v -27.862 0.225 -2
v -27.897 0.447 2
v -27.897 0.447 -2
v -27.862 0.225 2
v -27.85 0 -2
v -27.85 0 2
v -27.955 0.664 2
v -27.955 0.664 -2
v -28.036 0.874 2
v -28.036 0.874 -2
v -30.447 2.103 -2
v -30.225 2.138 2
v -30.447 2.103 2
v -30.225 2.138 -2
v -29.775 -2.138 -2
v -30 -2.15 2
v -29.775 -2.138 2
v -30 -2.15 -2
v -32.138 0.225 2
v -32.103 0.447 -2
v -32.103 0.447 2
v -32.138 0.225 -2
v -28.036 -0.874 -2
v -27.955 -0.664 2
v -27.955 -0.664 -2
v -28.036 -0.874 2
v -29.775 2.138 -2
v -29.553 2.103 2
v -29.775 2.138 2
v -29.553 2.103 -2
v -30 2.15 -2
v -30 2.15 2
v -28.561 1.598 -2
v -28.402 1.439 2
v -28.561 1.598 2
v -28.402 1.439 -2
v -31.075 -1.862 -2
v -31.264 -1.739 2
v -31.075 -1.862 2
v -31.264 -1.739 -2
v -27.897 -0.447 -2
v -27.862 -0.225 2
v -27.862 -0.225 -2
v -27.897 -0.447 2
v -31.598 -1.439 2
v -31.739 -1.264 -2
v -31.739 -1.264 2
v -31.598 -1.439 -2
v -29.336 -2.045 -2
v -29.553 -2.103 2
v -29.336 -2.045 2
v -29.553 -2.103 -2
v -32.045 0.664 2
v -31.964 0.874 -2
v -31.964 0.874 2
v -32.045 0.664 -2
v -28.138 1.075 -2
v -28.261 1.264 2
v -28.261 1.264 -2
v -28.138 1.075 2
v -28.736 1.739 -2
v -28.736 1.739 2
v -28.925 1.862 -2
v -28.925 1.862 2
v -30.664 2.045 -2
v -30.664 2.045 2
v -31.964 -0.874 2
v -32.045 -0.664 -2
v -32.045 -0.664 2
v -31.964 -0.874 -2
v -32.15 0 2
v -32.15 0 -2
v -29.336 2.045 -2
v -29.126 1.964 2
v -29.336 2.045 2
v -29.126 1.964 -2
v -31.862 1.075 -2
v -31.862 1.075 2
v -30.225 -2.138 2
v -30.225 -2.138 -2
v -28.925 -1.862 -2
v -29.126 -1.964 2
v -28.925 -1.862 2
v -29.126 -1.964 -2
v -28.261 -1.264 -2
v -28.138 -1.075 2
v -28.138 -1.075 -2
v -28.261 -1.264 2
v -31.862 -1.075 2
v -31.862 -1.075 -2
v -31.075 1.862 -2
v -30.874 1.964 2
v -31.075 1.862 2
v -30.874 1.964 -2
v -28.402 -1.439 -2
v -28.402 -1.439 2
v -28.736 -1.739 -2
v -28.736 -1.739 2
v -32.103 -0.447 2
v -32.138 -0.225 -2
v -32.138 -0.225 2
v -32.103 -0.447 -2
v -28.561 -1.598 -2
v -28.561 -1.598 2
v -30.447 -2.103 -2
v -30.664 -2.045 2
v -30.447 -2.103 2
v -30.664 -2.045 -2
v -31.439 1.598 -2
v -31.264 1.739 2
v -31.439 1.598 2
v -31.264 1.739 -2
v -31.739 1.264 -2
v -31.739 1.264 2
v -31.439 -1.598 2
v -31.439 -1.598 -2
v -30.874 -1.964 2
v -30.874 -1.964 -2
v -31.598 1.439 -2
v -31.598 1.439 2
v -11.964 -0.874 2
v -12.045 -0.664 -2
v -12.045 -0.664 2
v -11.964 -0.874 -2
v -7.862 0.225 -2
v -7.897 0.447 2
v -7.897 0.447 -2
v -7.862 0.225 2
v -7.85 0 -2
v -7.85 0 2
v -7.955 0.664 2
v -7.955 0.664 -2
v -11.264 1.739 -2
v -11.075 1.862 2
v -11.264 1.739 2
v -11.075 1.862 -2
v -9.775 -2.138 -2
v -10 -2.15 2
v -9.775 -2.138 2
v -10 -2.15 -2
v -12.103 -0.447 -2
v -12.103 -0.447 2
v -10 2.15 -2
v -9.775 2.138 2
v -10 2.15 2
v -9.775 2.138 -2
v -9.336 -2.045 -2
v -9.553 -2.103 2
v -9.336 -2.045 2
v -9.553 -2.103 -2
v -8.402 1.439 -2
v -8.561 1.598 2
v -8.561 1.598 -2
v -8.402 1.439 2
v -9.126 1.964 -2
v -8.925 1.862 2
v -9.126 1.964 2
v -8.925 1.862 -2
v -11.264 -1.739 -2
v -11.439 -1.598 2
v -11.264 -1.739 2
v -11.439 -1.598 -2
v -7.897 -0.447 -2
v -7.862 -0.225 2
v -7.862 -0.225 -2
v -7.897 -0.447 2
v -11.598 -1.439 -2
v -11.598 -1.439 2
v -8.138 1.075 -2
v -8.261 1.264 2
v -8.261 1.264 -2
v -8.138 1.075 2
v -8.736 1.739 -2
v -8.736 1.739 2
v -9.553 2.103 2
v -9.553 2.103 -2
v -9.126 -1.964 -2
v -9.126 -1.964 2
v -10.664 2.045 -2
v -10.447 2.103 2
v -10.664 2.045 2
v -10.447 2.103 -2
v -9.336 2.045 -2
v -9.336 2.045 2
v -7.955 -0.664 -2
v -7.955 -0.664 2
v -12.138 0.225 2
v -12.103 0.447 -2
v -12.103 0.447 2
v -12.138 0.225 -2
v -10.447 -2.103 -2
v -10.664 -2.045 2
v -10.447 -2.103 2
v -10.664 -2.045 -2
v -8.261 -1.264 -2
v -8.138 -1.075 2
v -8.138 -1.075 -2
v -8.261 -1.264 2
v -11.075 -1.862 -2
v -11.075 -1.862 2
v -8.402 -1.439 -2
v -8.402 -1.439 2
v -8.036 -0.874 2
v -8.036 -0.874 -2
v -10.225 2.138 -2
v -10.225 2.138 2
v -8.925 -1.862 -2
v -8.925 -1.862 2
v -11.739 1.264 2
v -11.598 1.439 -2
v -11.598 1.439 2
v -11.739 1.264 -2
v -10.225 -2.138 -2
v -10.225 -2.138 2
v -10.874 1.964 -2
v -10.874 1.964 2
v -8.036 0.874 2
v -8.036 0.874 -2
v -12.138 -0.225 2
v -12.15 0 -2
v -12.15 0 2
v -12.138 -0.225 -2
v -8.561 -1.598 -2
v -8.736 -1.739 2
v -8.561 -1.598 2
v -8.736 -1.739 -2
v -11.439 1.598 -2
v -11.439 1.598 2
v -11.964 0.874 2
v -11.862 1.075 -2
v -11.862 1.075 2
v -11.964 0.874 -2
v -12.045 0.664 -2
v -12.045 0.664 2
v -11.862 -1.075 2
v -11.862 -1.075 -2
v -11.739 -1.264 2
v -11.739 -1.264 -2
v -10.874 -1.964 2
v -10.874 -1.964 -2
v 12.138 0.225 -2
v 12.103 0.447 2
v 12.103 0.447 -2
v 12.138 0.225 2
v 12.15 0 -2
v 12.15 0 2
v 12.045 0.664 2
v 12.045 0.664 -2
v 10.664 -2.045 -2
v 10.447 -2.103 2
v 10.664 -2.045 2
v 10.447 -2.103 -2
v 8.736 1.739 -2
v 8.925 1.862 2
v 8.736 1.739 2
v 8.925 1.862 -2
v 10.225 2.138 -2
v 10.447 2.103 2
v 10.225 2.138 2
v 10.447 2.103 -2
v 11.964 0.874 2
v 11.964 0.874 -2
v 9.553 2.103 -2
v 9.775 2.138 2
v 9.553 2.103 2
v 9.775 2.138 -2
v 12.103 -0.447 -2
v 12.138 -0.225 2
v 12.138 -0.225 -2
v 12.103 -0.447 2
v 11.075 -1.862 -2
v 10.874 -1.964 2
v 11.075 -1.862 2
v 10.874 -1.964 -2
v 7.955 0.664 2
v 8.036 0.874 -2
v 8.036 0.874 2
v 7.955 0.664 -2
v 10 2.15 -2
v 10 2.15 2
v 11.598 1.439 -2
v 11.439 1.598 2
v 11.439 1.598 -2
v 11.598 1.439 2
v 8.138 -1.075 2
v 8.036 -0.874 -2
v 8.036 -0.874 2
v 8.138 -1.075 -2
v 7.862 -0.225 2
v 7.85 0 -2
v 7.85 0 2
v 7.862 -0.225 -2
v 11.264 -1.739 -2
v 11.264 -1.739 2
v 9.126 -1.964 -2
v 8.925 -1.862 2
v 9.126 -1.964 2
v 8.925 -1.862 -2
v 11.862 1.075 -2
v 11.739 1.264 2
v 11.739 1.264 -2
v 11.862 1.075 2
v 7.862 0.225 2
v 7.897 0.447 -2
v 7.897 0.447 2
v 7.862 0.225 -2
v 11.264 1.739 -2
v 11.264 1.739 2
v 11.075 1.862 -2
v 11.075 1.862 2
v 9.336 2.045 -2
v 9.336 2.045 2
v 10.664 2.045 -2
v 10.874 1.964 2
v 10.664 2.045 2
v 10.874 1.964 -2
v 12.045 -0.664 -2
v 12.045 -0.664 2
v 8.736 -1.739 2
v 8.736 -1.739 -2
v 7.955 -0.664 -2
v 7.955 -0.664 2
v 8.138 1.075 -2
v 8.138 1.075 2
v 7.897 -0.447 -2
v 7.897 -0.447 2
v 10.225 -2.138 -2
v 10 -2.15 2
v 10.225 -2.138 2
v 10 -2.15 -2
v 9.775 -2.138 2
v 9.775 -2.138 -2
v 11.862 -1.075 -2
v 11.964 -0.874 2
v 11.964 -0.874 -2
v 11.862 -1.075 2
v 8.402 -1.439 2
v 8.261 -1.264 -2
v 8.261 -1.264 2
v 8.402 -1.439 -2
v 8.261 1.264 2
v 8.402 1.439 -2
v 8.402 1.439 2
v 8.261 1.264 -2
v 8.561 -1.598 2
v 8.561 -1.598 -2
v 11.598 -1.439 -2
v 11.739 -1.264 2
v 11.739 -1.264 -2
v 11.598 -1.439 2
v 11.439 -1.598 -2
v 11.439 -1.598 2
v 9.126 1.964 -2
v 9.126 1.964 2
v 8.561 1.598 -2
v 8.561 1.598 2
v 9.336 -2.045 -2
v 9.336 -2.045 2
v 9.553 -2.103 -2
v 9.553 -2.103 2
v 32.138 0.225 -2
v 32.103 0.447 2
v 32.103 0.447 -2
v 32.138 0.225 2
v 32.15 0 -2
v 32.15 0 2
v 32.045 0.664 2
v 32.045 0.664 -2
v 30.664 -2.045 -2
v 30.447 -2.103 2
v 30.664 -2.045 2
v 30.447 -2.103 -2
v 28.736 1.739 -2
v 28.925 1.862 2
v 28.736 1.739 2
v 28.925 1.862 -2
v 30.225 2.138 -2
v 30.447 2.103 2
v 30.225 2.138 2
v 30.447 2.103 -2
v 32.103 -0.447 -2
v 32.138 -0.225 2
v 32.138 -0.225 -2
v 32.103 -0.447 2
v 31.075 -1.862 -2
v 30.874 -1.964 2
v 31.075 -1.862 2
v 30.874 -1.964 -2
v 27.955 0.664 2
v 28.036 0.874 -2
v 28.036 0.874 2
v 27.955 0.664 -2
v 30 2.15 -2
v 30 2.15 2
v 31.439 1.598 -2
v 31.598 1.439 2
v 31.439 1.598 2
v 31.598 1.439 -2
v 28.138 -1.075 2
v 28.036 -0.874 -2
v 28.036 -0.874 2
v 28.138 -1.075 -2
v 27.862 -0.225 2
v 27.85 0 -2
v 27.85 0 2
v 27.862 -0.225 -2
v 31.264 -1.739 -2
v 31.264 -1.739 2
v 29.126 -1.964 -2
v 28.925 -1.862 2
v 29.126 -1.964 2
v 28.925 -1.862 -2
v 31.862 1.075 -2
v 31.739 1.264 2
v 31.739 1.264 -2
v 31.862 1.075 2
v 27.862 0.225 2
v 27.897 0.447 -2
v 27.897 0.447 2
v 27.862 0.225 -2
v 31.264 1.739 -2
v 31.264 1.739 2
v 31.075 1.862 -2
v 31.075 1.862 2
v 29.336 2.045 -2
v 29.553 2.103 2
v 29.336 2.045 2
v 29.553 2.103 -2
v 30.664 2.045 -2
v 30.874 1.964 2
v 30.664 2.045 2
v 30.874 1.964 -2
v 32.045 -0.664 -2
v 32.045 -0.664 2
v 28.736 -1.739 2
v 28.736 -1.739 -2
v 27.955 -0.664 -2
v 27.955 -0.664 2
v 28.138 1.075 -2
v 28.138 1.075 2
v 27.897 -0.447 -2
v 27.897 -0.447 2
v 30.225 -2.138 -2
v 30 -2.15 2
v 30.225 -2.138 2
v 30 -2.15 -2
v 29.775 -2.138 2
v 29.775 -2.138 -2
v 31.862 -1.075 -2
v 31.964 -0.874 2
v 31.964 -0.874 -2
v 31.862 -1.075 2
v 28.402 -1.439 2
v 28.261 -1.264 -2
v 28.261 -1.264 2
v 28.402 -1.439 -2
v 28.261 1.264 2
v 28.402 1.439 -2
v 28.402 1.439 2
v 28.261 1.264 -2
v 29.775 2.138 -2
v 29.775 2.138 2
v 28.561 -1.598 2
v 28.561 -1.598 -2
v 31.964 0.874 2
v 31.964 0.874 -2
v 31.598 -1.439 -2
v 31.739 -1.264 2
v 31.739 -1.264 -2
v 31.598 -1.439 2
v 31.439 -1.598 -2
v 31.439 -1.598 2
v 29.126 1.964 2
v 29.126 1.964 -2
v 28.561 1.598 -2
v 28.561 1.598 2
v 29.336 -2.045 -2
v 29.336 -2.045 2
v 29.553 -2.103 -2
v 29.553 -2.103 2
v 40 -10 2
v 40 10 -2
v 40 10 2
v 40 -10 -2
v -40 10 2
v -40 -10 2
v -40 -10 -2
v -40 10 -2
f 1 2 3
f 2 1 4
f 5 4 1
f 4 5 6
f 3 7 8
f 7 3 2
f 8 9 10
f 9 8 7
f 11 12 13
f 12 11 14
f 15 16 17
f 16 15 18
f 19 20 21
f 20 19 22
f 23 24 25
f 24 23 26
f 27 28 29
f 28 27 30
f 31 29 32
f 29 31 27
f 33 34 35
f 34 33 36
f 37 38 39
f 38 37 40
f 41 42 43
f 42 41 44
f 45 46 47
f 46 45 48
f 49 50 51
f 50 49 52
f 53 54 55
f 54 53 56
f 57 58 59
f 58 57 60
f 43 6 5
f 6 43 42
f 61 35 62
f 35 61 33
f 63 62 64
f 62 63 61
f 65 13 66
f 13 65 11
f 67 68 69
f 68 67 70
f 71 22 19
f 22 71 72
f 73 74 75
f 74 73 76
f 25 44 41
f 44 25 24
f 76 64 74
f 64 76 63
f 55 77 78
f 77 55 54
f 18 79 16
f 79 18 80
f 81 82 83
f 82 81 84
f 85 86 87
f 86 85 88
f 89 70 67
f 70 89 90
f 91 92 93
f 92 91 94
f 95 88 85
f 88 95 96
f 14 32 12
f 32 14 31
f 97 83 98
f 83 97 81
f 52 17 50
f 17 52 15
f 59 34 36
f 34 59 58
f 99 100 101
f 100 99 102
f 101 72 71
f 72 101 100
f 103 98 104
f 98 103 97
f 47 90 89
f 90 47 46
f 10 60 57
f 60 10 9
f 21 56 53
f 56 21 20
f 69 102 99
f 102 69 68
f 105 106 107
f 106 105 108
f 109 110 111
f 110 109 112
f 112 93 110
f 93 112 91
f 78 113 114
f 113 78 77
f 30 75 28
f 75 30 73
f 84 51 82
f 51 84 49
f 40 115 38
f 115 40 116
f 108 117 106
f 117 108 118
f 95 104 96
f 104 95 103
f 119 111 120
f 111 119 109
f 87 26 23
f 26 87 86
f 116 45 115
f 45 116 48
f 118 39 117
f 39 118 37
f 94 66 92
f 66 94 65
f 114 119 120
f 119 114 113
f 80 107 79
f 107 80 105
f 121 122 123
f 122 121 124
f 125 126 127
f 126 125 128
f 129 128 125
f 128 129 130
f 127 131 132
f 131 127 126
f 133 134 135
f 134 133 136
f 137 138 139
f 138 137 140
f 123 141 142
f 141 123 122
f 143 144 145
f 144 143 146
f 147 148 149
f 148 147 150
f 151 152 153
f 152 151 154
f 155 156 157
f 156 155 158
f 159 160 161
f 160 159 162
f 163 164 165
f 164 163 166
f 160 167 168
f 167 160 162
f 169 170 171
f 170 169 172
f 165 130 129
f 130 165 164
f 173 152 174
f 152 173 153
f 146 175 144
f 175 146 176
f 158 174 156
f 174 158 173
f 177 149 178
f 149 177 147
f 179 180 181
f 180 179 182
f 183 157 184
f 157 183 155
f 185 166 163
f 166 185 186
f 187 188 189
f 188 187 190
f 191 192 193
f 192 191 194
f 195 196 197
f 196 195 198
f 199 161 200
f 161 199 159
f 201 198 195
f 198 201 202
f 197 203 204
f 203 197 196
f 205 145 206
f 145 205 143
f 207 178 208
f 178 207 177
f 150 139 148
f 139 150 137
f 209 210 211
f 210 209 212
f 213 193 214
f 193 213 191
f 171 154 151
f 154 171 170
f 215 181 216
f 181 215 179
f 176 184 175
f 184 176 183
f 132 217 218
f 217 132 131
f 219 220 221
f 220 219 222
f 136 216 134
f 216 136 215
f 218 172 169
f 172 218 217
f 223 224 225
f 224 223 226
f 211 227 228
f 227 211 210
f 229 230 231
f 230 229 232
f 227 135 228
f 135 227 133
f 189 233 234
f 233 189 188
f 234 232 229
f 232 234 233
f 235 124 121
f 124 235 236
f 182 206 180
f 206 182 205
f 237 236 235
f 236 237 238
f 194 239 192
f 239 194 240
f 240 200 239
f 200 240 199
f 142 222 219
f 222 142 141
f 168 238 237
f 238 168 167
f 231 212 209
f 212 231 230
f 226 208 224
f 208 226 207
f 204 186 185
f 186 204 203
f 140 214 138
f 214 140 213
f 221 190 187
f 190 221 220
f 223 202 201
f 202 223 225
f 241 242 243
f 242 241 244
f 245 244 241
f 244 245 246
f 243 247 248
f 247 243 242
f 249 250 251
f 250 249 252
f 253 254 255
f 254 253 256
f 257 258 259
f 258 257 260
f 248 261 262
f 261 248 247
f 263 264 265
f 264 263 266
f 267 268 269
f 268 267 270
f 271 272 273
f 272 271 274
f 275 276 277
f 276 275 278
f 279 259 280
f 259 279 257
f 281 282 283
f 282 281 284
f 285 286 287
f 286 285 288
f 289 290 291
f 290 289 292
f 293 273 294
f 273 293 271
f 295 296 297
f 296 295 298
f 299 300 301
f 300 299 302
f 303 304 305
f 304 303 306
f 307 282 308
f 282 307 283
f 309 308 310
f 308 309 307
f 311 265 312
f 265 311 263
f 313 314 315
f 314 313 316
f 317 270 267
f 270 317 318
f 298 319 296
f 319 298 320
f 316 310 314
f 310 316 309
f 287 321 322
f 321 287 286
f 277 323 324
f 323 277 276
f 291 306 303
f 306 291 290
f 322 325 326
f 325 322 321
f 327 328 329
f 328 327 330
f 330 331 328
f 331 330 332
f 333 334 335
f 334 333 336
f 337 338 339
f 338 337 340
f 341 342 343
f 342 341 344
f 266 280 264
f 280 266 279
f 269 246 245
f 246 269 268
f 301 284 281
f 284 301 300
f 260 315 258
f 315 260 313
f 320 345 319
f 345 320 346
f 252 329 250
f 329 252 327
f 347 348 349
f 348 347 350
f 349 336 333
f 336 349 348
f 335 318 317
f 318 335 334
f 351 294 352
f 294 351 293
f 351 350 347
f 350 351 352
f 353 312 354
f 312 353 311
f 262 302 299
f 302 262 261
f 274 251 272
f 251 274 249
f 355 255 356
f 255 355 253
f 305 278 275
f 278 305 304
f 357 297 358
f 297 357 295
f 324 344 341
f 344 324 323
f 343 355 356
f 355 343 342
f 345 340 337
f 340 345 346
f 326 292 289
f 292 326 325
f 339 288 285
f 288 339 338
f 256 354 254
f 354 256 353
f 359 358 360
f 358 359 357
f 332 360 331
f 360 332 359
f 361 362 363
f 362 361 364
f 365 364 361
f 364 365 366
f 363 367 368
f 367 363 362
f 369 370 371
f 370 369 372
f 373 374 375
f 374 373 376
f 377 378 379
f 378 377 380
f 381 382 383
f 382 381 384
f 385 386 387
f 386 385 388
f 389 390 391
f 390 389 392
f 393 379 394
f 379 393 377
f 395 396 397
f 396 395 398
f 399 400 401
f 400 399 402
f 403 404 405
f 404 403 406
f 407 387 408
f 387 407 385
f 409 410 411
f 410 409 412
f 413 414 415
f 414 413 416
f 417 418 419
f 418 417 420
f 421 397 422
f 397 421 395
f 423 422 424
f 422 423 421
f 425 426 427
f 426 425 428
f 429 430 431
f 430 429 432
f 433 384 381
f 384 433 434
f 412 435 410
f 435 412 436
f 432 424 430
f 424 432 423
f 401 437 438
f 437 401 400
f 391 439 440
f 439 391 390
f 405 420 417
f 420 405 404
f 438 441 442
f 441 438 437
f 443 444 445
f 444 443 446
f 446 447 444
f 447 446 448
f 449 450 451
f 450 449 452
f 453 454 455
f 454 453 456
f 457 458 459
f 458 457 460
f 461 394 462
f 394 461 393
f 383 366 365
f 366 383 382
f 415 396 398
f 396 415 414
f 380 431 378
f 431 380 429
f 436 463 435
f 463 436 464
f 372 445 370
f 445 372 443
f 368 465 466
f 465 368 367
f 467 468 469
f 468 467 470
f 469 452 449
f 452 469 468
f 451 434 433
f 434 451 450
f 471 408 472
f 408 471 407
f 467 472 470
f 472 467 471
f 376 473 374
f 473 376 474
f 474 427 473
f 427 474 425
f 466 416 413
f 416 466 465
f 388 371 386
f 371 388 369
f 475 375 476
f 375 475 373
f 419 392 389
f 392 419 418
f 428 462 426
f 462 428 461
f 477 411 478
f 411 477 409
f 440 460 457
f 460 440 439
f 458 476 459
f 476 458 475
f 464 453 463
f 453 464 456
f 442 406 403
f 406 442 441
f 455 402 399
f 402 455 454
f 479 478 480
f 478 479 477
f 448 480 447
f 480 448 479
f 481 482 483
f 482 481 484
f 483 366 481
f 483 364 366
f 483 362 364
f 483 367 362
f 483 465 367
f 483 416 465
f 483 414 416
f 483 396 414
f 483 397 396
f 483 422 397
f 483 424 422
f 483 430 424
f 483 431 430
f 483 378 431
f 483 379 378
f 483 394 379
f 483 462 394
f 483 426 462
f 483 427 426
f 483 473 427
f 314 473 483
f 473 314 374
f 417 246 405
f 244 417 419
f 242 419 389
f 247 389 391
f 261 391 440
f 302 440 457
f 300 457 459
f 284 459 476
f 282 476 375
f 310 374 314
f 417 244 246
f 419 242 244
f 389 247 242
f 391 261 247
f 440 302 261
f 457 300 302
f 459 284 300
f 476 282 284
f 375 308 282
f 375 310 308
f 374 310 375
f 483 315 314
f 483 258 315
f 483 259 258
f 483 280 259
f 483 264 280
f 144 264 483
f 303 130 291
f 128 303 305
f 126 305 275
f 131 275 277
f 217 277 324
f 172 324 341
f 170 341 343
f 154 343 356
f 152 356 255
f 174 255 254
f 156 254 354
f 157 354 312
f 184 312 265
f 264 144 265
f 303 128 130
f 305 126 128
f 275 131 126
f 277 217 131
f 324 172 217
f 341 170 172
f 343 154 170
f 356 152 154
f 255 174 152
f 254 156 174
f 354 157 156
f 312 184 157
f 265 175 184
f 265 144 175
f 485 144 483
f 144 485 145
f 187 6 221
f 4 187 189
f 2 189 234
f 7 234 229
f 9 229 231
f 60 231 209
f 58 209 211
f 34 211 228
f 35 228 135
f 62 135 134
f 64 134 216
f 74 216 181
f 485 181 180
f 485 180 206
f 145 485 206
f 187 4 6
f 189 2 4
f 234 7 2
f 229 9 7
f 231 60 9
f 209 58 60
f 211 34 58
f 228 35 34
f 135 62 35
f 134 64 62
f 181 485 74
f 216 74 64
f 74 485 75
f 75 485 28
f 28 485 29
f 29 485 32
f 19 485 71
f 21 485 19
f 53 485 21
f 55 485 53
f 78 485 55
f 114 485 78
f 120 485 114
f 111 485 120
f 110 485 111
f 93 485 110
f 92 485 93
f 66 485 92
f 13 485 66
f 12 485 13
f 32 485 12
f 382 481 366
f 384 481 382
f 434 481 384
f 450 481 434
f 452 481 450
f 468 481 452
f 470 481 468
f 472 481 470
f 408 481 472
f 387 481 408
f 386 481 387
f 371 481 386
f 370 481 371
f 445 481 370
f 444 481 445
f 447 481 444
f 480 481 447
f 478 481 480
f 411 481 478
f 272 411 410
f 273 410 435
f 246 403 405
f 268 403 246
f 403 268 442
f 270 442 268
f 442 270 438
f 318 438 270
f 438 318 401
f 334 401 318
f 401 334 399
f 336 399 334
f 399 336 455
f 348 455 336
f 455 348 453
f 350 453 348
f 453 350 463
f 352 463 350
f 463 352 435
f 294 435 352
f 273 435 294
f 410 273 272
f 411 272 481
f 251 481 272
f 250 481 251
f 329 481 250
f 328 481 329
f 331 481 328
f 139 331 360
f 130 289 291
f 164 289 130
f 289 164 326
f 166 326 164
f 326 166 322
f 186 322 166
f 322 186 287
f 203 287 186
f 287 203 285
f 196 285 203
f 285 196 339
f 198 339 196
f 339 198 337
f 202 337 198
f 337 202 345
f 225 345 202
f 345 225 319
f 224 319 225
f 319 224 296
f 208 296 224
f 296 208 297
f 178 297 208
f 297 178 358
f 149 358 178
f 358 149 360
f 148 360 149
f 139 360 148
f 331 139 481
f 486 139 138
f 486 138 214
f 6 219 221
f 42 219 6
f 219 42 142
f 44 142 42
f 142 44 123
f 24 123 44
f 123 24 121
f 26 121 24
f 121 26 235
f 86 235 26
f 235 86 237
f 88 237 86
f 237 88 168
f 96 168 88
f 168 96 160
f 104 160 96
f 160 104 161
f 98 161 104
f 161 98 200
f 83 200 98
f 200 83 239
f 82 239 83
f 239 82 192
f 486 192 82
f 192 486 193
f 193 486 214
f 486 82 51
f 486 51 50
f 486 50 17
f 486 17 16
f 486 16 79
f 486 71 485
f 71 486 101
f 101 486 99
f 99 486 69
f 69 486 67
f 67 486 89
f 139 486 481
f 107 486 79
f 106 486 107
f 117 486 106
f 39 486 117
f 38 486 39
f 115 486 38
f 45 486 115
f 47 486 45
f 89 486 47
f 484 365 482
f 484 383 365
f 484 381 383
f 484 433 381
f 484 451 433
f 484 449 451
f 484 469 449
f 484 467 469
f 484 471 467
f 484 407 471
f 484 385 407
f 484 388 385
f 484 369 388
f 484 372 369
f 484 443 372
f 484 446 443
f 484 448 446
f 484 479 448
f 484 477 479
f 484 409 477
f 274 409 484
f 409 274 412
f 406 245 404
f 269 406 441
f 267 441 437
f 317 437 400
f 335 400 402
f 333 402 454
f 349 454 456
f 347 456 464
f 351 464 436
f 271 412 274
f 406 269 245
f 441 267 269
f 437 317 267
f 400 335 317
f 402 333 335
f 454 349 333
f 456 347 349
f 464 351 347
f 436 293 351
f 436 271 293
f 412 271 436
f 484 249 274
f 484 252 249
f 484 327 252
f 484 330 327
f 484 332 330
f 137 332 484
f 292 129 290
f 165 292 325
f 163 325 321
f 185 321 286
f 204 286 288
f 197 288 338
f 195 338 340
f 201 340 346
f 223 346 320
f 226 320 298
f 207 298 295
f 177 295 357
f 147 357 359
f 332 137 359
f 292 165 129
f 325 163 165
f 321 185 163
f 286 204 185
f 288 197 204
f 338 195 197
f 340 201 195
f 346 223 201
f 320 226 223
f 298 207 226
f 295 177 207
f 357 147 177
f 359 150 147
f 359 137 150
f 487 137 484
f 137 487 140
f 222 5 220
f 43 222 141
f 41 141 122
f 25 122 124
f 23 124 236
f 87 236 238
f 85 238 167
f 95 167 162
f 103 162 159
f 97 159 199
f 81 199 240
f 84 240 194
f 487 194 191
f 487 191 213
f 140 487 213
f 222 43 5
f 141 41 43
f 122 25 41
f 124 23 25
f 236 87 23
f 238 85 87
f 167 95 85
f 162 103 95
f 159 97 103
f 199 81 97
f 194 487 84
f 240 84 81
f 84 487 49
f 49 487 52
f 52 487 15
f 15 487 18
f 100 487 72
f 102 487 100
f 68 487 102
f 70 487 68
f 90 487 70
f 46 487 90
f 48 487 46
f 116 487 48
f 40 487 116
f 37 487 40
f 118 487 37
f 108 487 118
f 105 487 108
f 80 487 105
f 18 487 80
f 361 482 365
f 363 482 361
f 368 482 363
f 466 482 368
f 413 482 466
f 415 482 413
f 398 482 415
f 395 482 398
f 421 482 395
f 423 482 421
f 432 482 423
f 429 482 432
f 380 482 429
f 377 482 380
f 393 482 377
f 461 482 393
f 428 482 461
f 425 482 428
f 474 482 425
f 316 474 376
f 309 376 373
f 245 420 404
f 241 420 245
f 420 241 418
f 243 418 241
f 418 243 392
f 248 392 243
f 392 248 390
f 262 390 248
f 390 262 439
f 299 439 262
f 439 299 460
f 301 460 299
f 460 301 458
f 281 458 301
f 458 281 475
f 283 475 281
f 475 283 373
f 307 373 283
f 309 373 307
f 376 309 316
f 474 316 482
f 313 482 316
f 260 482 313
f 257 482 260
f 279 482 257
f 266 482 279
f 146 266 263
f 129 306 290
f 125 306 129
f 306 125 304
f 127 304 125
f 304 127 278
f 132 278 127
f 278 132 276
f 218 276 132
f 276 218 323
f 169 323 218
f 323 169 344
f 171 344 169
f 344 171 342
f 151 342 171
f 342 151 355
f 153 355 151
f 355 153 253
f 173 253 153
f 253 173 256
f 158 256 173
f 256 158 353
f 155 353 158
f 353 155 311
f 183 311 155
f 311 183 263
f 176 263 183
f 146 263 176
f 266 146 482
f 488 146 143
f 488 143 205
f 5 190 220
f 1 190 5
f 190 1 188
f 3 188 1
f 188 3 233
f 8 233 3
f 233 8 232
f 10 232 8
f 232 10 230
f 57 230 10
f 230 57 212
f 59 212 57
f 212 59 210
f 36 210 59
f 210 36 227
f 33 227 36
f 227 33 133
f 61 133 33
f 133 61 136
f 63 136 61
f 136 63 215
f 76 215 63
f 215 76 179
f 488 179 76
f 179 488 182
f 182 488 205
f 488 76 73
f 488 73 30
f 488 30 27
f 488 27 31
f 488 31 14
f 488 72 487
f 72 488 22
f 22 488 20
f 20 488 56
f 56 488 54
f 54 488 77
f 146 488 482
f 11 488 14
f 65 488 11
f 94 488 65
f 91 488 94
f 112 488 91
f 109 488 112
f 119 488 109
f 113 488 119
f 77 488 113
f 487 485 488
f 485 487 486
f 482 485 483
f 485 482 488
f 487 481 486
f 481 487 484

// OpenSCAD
// Linear rail spacer strip.
$fn = 60;
eps = 0.02;
length = 80;
width = 20;
thickness = 4;
hole_pitch = 20;
difference() {
    cube([length,width,thickness],center=true);
    for (x=[-length/2+10:hole_pitch:length/2-10]) translate([x,0,-thickness/2-eps]) cylinder(d=4.3,h=thickness+2*eps);
}
